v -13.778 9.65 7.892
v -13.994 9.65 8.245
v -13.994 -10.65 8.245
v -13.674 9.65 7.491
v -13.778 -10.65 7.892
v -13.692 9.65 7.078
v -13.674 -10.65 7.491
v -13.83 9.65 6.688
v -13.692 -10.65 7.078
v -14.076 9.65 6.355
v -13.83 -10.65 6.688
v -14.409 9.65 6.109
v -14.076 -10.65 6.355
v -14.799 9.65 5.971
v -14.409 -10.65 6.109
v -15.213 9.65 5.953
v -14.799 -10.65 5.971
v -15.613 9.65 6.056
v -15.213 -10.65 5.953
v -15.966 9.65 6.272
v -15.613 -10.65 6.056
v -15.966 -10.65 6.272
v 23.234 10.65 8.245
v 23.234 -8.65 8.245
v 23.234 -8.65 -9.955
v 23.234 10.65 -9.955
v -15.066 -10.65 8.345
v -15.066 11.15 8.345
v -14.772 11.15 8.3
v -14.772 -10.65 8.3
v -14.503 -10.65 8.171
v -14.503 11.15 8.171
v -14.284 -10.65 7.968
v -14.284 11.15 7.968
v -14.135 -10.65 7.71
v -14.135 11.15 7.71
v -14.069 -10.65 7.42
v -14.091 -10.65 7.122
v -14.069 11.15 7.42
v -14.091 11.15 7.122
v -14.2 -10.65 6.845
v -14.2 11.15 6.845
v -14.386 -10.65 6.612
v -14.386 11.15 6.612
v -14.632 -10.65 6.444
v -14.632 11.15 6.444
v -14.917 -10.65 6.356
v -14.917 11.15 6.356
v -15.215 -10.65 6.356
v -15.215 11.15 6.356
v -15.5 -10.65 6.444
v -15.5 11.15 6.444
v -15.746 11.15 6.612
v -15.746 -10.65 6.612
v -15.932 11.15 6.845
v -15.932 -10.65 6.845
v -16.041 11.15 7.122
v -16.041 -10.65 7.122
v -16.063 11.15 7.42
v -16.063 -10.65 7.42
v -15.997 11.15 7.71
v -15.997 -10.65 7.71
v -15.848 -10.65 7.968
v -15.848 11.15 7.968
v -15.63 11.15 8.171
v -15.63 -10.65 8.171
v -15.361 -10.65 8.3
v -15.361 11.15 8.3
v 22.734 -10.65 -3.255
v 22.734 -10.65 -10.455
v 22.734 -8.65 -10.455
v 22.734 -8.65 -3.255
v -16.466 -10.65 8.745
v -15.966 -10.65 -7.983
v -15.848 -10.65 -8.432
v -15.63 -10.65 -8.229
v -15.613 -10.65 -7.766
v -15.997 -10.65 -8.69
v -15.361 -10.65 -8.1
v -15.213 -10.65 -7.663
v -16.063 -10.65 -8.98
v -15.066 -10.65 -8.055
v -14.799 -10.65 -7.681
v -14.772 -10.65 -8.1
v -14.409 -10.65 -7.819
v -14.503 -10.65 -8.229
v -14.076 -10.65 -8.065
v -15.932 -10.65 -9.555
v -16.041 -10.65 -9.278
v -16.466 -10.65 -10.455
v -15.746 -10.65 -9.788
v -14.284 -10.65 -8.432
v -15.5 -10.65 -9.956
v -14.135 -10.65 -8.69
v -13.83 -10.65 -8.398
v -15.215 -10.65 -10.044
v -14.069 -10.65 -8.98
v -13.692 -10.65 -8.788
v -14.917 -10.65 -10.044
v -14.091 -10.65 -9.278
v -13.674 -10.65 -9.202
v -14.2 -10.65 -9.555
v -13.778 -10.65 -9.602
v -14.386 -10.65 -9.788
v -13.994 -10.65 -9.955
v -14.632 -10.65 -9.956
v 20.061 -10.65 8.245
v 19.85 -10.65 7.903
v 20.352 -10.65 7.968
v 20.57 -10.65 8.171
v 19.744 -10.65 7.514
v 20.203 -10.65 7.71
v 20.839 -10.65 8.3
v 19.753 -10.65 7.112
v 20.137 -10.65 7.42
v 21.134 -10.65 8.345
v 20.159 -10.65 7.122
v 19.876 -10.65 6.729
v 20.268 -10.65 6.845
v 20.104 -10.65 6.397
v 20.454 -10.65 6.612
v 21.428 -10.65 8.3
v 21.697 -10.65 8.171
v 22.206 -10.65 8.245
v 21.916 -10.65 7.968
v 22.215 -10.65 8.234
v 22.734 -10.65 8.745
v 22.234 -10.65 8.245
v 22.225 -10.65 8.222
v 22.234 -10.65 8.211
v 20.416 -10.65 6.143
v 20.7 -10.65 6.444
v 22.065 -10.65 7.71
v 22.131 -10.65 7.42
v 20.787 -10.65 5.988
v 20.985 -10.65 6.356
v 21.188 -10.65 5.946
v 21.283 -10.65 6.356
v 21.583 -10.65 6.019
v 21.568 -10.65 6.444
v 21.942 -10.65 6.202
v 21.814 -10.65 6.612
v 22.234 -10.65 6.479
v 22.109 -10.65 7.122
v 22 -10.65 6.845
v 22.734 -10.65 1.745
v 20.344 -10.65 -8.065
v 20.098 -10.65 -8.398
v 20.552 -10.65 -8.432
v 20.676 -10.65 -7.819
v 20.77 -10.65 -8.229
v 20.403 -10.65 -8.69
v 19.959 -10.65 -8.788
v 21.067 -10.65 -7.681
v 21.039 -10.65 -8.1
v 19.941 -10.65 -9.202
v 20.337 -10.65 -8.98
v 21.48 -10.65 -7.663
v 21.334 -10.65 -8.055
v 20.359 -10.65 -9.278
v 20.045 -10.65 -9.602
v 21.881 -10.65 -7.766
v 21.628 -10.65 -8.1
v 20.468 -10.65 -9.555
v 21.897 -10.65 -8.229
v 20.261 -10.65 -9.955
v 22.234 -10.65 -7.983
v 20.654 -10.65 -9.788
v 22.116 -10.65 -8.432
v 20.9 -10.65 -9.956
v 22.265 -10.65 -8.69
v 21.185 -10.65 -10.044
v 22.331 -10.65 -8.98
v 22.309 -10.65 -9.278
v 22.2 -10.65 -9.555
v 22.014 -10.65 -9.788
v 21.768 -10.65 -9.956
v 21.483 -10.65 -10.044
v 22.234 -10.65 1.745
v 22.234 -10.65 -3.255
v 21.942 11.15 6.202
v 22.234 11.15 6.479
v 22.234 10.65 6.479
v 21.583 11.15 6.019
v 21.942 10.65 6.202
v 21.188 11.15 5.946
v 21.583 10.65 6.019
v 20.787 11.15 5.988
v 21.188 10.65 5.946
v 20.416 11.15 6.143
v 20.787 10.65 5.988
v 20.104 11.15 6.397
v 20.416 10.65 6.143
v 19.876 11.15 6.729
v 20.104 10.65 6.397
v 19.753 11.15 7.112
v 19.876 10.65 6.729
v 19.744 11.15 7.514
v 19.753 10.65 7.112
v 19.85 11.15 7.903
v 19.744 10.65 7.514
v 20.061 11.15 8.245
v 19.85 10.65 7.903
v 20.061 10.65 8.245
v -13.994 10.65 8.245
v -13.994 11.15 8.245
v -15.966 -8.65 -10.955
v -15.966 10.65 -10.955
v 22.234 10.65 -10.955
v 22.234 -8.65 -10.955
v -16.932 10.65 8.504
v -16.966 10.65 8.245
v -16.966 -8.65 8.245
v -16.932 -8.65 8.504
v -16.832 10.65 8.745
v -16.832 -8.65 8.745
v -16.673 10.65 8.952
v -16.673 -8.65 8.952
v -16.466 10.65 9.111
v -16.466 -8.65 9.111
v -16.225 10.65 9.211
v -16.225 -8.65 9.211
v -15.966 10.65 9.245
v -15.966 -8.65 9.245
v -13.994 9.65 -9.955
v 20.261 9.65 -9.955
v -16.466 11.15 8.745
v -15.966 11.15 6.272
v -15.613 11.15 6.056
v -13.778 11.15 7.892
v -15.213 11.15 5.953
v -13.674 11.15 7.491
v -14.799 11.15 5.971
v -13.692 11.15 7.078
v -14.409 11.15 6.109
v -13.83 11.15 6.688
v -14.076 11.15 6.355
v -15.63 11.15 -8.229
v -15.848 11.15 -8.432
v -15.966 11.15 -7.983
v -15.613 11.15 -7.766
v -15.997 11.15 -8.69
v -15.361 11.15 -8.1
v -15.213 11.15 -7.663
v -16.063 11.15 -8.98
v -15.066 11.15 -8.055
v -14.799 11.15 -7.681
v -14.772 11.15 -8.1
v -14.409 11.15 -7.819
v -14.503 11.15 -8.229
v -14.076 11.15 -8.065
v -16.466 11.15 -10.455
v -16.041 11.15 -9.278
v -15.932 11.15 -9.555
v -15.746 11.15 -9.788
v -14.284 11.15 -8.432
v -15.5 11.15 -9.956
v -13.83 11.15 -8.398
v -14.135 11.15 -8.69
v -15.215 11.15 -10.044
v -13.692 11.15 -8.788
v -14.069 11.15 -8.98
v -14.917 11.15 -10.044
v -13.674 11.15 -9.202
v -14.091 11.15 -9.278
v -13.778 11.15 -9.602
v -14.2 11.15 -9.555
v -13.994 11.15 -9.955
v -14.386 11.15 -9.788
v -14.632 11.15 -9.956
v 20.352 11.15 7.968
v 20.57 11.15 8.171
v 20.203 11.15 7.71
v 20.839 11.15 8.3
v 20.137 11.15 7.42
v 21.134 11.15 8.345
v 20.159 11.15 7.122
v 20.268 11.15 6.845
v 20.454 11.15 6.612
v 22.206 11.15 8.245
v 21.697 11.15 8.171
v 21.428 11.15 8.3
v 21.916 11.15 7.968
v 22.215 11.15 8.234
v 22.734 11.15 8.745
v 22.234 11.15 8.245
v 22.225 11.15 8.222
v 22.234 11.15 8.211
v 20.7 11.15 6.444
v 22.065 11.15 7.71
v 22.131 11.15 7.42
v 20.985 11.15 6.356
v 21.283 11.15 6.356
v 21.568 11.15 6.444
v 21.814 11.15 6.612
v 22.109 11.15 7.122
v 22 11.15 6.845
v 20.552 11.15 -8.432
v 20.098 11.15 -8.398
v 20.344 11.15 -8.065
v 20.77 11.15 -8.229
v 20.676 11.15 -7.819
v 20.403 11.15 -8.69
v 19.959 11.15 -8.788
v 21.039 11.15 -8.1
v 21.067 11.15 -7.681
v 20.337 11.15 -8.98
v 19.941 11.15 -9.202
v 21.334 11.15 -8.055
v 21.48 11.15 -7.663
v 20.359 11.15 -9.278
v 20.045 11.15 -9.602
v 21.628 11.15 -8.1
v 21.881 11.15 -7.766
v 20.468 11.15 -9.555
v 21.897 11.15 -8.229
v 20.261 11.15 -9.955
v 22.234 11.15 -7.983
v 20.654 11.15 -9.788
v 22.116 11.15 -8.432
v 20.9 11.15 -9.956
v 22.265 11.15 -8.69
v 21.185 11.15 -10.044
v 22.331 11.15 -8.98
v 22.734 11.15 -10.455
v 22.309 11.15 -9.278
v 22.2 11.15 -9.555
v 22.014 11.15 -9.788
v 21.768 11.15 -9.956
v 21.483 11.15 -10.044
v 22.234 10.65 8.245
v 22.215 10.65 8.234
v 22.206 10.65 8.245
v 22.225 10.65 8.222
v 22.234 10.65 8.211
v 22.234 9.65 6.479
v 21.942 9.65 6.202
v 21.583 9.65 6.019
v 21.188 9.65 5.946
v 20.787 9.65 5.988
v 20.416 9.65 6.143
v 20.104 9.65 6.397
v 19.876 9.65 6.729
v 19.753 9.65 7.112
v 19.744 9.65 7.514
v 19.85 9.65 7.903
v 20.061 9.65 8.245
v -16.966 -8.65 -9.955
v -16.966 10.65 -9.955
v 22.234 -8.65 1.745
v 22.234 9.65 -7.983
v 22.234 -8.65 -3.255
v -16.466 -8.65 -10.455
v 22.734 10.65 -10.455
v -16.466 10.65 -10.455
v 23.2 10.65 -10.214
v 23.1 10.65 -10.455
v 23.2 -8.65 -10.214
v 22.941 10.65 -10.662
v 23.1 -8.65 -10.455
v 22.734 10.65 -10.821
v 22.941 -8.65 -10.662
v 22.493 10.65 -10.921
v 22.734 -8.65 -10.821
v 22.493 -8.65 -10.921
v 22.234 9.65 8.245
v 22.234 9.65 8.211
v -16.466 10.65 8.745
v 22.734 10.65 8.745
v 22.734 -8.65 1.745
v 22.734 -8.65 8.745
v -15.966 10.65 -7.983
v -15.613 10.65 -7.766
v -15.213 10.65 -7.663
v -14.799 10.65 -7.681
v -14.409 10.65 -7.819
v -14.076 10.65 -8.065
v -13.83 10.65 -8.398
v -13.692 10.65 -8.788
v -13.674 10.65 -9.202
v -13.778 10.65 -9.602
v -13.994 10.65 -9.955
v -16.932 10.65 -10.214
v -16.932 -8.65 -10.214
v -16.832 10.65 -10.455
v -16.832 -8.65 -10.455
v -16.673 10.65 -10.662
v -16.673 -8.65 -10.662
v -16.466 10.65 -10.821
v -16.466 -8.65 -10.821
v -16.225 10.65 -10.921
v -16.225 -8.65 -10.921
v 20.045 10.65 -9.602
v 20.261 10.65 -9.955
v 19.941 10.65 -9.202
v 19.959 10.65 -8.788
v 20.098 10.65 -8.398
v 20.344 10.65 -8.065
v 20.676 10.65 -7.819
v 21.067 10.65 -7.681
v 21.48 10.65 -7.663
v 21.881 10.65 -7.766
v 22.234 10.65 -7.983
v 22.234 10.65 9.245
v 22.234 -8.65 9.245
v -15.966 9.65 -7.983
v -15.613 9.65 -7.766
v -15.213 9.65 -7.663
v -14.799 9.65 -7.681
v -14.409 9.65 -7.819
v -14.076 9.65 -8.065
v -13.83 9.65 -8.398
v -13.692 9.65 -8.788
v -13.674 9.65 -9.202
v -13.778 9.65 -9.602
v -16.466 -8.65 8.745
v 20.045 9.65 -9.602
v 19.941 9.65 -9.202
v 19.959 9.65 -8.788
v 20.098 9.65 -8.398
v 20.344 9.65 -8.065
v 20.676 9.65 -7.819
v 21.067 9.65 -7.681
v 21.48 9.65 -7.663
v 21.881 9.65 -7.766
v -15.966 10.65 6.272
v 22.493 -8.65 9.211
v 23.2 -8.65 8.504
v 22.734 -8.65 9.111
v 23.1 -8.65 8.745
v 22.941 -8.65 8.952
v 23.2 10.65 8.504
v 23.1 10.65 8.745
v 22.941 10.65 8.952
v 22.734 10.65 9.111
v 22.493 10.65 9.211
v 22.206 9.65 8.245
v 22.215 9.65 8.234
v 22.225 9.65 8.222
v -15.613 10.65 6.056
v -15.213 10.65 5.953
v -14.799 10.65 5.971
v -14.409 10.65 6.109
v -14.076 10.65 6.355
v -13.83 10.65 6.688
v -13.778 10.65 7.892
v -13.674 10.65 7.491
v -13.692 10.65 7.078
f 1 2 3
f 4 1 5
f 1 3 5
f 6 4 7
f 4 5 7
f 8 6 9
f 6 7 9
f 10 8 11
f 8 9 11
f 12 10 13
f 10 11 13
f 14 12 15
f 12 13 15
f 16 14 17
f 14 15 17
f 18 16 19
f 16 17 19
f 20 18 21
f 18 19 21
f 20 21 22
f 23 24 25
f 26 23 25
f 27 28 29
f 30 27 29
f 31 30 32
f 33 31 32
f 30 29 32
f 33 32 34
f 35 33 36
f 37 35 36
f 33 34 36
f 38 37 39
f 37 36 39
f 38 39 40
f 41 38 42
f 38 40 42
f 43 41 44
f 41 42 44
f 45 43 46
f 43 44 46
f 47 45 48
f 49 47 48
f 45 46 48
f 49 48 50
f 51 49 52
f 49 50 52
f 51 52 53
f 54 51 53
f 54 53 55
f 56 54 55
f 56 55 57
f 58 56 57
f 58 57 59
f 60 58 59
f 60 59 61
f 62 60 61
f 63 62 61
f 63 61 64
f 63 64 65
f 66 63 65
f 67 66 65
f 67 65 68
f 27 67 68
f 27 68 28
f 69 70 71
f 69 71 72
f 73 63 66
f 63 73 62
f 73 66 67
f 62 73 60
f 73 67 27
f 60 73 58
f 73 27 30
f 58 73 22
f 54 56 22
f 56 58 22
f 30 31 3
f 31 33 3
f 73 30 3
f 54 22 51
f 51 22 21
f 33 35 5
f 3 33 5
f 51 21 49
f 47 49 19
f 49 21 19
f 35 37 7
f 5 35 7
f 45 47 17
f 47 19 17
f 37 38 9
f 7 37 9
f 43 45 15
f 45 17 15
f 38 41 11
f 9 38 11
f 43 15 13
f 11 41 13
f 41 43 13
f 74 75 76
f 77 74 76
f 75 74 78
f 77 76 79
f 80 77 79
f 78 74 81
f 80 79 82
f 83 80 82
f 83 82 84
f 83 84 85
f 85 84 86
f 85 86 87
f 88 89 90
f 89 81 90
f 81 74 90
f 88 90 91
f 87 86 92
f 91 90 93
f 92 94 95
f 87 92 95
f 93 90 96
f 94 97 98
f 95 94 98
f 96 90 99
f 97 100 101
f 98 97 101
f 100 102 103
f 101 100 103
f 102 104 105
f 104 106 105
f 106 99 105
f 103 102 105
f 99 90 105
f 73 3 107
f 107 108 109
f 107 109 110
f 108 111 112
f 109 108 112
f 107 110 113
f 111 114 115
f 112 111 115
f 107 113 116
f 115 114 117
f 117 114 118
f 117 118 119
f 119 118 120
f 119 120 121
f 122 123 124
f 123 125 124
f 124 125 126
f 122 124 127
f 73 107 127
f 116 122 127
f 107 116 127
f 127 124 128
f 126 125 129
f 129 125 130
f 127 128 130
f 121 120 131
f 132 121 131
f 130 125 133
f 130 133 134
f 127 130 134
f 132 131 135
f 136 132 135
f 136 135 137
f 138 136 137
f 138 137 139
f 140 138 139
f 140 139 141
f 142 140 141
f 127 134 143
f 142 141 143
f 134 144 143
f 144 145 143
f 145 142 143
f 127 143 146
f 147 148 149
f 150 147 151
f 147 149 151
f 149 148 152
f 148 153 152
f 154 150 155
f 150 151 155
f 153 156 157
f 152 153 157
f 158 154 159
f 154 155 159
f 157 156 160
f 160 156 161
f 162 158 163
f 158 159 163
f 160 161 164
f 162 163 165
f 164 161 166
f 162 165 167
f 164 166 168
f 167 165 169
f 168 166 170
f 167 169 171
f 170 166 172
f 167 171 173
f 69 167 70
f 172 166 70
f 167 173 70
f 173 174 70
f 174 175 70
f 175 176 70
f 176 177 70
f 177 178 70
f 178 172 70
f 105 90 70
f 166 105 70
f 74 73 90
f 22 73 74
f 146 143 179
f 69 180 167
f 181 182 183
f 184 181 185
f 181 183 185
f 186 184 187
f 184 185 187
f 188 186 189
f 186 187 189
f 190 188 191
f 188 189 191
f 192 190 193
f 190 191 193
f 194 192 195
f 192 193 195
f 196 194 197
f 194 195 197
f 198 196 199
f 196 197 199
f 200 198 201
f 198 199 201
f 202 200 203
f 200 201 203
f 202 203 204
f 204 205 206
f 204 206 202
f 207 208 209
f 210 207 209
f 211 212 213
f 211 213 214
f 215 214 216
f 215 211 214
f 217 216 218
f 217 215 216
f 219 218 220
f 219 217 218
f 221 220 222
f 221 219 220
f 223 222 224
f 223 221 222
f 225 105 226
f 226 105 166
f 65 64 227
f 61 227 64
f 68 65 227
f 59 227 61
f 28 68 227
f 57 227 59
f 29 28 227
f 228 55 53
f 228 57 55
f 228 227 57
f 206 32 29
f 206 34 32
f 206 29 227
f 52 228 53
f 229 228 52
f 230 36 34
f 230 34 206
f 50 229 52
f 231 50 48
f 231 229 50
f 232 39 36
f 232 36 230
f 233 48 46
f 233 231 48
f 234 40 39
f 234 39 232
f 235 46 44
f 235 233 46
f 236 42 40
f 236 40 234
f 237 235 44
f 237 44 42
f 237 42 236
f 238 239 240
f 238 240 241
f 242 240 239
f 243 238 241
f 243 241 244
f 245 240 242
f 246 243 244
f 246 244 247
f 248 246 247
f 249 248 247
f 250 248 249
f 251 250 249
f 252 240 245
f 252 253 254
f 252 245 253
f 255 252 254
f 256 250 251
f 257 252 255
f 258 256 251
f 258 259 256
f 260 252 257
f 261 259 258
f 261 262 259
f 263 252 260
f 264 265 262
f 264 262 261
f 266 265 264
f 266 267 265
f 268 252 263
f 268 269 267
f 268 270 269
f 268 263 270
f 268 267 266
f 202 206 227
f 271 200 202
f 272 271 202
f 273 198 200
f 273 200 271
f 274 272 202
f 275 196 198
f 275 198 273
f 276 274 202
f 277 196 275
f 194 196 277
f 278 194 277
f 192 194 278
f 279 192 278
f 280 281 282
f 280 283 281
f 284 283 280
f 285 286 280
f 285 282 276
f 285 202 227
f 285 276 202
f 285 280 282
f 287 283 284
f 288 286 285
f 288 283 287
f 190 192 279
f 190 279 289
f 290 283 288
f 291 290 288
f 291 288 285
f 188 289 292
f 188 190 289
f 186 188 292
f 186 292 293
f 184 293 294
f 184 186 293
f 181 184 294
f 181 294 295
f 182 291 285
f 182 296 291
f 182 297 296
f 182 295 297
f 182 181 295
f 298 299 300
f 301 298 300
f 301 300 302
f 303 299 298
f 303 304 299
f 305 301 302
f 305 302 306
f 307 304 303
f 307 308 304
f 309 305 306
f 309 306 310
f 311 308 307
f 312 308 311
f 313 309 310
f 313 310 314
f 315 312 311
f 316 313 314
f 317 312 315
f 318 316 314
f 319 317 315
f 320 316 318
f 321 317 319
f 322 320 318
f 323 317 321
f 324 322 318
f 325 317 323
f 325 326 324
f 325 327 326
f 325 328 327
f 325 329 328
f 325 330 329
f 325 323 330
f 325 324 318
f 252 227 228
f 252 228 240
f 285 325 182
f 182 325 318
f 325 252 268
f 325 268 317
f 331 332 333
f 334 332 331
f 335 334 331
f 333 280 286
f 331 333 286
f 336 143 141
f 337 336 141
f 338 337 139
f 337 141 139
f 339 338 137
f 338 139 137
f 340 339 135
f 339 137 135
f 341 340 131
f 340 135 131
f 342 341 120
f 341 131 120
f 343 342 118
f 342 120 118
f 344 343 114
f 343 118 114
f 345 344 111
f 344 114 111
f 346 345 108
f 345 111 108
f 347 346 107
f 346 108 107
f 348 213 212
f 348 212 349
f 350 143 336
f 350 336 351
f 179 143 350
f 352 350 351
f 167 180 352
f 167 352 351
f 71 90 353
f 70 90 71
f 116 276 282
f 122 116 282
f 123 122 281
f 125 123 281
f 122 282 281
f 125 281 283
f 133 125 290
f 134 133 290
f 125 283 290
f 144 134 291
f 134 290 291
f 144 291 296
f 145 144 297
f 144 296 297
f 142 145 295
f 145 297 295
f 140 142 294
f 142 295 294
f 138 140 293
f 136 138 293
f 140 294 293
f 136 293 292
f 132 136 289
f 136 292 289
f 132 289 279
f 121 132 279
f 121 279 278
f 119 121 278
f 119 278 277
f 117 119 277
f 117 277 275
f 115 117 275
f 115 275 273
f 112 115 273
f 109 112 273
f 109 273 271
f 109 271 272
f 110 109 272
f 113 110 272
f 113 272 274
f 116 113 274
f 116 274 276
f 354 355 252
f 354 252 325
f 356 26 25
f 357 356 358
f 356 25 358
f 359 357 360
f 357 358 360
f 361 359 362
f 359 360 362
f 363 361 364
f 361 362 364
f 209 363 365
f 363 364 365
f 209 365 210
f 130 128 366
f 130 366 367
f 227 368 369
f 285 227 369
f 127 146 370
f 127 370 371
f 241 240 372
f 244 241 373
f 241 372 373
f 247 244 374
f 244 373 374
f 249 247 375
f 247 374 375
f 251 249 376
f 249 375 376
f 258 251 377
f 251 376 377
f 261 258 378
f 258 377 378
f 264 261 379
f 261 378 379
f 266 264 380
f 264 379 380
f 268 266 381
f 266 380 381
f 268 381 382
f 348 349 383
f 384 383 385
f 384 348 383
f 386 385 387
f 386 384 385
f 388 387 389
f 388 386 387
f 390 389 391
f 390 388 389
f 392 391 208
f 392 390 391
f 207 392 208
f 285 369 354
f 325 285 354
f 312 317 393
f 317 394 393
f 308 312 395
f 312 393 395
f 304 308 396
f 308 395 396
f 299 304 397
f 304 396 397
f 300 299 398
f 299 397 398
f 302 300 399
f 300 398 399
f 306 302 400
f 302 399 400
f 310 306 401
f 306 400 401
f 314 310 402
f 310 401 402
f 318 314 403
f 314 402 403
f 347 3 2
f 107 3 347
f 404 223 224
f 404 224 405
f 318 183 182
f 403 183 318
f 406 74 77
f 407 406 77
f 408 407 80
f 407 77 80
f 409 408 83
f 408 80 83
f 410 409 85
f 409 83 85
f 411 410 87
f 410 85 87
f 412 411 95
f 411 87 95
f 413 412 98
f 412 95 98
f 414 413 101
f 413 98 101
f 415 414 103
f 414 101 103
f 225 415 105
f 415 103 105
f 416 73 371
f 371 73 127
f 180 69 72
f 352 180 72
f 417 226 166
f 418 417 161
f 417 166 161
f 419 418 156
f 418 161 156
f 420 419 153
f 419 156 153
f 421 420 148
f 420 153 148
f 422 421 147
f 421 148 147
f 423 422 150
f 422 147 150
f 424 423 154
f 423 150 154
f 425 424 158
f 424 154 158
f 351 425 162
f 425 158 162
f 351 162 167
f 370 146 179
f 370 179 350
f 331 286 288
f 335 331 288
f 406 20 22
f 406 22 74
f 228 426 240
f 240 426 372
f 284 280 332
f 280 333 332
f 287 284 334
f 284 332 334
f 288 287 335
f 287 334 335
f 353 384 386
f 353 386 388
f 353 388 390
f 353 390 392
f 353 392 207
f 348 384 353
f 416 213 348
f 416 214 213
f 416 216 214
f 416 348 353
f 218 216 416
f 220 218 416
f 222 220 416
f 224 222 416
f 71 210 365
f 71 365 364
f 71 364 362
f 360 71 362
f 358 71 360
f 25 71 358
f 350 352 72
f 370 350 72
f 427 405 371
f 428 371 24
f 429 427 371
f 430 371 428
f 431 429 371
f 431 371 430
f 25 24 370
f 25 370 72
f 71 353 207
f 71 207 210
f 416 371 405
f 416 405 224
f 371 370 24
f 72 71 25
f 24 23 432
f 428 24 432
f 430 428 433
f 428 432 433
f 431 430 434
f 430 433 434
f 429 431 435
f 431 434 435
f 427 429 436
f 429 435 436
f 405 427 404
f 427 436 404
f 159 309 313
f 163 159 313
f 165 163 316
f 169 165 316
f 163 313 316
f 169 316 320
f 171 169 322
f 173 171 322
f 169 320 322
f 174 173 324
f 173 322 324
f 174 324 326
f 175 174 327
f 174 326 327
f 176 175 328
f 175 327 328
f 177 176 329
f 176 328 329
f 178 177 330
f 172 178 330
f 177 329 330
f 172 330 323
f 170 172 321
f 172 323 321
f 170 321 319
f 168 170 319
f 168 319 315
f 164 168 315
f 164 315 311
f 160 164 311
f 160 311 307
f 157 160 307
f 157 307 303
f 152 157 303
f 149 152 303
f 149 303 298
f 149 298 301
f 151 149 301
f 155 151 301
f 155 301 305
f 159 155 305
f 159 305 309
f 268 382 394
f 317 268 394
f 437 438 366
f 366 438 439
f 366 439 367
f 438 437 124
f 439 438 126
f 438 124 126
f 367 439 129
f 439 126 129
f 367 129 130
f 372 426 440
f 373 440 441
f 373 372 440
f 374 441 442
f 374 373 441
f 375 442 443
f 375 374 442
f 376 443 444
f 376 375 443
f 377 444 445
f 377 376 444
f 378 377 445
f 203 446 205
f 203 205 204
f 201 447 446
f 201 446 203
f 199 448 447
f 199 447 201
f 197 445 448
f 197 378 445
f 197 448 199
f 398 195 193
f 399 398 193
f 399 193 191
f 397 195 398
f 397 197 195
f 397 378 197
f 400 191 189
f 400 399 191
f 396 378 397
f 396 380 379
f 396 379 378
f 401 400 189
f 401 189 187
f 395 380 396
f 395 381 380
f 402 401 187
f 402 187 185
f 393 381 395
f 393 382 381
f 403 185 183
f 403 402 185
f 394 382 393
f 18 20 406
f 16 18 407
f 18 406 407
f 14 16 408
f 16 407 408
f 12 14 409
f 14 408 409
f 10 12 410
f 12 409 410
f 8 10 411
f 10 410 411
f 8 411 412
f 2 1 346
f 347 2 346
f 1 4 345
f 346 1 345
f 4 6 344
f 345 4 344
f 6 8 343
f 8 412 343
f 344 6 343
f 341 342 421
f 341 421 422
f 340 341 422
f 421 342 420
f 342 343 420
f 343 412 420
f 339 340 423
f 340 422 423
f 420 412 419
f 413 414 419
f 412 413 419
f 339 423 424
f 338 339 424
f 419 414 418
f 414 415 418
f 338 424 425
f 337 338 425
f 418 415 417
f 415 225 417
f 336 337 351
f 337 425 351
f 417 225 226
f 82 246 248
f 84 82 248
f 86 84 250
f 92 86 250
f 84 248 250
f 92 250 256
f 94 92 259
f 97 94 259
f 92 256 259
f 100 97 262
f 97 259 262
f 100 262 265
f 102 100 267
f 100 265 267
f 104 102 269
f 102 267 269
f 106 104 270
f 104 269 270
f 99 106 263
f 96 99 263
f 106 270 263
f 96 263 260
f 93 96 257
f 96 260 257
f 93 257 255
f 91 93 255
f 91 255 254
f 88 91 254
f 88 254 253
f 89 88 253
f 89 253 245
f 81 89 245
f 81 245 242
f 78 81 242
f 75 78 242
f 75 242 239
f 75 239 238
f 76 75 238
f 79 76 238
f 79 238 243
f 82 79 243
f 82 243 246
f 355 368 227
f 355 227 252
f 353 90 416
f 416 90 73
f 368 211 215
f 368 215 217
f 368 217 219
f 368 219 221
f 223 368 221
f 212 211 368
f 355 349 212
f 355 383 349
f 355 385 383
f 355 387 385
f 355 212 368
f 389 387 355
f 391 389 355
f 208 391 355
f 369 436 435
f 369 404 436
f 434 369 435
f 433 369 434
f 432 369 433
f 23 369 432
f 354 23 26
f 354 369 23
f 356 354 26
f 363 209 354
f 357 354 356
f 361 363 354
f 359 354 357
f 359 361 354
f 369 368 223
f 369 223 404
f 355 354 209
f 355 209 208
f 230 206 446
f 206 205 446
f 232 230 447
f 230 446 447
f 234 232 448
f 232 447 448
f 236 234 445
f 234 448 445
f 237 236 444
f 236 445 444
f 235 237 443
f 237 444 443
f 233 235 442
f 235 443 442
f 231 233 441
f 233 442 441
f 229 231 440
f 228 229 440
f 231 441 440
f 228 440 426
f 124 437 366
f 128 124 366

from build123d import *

# Parameters (mm, degrees)
SKETCH1_W           = 40.2
SKETCH1_H           = 20.2
SKETCH1_W_2         = 38.2
SKETCH1_H_2         = 18.2
BOSS_EXTRUDE1_DEPTH = 10.65
FILLET1_R           = 1
SKETCH2_W           = 39.2
SKETCH2_H           = 19.2
SKETCH2_W_2         = 38.2
SKETCH2_H_2         = 18.2
BOSS_EXTRUDE2_DEPTH = 0.5
SKETCH3_W           = 38.2
SKETCH3_H           = 18.2
BOSS_EXTRUDE3_DEPTH = 1
BOSS_EXTRUDE4_START = -21.8
SKETCH4_R           = 1.4
BOSS_EXTRUDE4_DEPTH = 21.8
SKETCH5_R           = 1
CUT_EXTRUDE1_DEPTH  = 34.690677644
SKETCH6_W           = 40.2
SKETCH6_H           = 20.2
SKETCH6_W_2         = 39.2
SKETCH6_H_2         = 19.2
CUT_EXTRUDE2_DEPTH  = 2
SKETCH7_W           = 5
SKETCH7_H           = 2
CUT_EXTRUDE3_DEPTH  = 0.5


with BuildPart() as part:
    # Sketch1 → Boss-Extrude1 (new, symmetric)
    with BuildSketch(Plane(origin=(0, 0, 0), x_dir=(1, 0, 0), z_dir=(0, 1, 0))):
        with Locations((3.133727572, 0.855166052)):
            Rectangle(SKETCH1_W, SKETCH1_H)
        with Locations((3.133727572, 0.855166052)):
            Rectangle(SKETCH1_W_2, SKETCH1_H_2, mode=Mode.SUBTRACT)
    extrude(amount=BOSS_EXTRUDE1_DEPTH, both=True)

    # Fillet1
    fillet1_edges = [part.edges().sort_by_distance(p)[0] for p in [
        (-16.966272428, 0, -10.955166052),
        (23.233727572, 0, -10.955166052),
        (23.233727572, 0, 9.244833948),
        (-16.966272428, 0, 9.244833948),
    ]]
    fillet(fillet1_edges, radius=FILLET1_R)

    # Sketch2 → Boss-Extrude2 (add)
    with BuildSketch(Plane(origin=(0, 10.65, 0), x_dir=(1, 0, 0), z_dir=(0, 1, 0))):
        with Locations((3.133727572, 0.855166052)):
            Rectangle(SKETCH2_W, SKETCH2_H)
        with Locations((3.133727572, 0.855166052)):
            Rectangle(SKETCH2_W_2, SKETCH2_H_2, mode=Mode.SUBTRACT)
    extrude(amount=BOSS_EXTRUDE2_DEPTH)

    # Sketch3 → Boss-Extrude3 (add)
    with BuildSketch(Plane(origin=(0, 10.65, 0), x_dir=(1, 0, 0), z_dir=(0, 1, 0))):
        with Locations((3.133727572, 0.855166052)):
            Rectangle(SKETCH3_W, SKETCH3_H)
    extrude(amount=-BOSS_EXTRUDE3_DEPTH)

    # Sketch4 → Boss-Extrude4 (add)
    with BuildSketch(Plane(origin=(0, 11.15, 0), x_dir=(1, 0, 0), z_dir=(0, 1, 0)).offset(BOSS_EXTRUDE4_START)):
        with Locations((-15.066272428, 9.055166052)):
            Circle(SKETCH4_R)
        with Locations((-15.066272428, -7.344833948)):
            Circle(SKETCH4_R)
        with Locations((21.333727572, 9.055166052)):
            Circle(SKETCH4_R)
        with Locations((21.133727572, -7.344833948)):
            Circle(SKETCH4_R)
    extrude(amount=BOSS_EXTRUDE4_DEPTH)

    # Sketch5 → Cut-Extrude1 (cut, through all)
    with BuildSketch(Plane(origin=(0, 11.15, 0), x_dir=(1, 0, 0), z_dir=(0, 1, 0))):
        with Locations(Location((-15.066272428, 9.055166052, 0), (0, 0, 270))):
            Circle(SKETCH5_R)
        with Locations(Location((-15.066272428, -7.344833948, 0), (0, 0, 270))):
            Circle(SKETCH5_R)
        with Locations(Location((21.333727572, 9.055166052, 0), (0, 0, 270))):
            Circle(SKETCH5_R)
        with Locations(Location((21.133727572, -7.344833948, 0), (0, 0, 270))):
            Circle(SKETCH5_R)
    extrude(amount=-CUT_EXTRUDE1_DEPTH, mode=Mode.SUBTRACT)

    # Sketch6 → Cut-Extrude2 (cut)
    with BuildSketch(Plane.XZ.offset(10.65)):
        with Locations((3.133727572, -0.855166052)):
            Rectangle(SKETCH6_W, SKETCH6_H)
        with Locations((3.133727572, -0.855166052)):
            Rectangle(SKETCH6_W_2, SKETCH6_H_2, mode=Mode.SUBTRACT)
    extrude(amount=-CUT_EXTRUDE2_DEPTH, mode=Mode.SUBTRACT)

    # Sketch7 → Cut-Extrude3 (cut)
    with BuildSketch(Plane(origin=(22.733727572, 0, 0), x_dir=(0, 0, -1), z_dir=(1, 0, 0))):
        with Locations((0.755166052, -9.65)):
            Rectangle(SKETCH7_W, SKETCH7_H)
    extrude(amount=-CUT_EXTRUDE3_DEPTH, mode=Mode.SUBTRACT)


solid = part.part
